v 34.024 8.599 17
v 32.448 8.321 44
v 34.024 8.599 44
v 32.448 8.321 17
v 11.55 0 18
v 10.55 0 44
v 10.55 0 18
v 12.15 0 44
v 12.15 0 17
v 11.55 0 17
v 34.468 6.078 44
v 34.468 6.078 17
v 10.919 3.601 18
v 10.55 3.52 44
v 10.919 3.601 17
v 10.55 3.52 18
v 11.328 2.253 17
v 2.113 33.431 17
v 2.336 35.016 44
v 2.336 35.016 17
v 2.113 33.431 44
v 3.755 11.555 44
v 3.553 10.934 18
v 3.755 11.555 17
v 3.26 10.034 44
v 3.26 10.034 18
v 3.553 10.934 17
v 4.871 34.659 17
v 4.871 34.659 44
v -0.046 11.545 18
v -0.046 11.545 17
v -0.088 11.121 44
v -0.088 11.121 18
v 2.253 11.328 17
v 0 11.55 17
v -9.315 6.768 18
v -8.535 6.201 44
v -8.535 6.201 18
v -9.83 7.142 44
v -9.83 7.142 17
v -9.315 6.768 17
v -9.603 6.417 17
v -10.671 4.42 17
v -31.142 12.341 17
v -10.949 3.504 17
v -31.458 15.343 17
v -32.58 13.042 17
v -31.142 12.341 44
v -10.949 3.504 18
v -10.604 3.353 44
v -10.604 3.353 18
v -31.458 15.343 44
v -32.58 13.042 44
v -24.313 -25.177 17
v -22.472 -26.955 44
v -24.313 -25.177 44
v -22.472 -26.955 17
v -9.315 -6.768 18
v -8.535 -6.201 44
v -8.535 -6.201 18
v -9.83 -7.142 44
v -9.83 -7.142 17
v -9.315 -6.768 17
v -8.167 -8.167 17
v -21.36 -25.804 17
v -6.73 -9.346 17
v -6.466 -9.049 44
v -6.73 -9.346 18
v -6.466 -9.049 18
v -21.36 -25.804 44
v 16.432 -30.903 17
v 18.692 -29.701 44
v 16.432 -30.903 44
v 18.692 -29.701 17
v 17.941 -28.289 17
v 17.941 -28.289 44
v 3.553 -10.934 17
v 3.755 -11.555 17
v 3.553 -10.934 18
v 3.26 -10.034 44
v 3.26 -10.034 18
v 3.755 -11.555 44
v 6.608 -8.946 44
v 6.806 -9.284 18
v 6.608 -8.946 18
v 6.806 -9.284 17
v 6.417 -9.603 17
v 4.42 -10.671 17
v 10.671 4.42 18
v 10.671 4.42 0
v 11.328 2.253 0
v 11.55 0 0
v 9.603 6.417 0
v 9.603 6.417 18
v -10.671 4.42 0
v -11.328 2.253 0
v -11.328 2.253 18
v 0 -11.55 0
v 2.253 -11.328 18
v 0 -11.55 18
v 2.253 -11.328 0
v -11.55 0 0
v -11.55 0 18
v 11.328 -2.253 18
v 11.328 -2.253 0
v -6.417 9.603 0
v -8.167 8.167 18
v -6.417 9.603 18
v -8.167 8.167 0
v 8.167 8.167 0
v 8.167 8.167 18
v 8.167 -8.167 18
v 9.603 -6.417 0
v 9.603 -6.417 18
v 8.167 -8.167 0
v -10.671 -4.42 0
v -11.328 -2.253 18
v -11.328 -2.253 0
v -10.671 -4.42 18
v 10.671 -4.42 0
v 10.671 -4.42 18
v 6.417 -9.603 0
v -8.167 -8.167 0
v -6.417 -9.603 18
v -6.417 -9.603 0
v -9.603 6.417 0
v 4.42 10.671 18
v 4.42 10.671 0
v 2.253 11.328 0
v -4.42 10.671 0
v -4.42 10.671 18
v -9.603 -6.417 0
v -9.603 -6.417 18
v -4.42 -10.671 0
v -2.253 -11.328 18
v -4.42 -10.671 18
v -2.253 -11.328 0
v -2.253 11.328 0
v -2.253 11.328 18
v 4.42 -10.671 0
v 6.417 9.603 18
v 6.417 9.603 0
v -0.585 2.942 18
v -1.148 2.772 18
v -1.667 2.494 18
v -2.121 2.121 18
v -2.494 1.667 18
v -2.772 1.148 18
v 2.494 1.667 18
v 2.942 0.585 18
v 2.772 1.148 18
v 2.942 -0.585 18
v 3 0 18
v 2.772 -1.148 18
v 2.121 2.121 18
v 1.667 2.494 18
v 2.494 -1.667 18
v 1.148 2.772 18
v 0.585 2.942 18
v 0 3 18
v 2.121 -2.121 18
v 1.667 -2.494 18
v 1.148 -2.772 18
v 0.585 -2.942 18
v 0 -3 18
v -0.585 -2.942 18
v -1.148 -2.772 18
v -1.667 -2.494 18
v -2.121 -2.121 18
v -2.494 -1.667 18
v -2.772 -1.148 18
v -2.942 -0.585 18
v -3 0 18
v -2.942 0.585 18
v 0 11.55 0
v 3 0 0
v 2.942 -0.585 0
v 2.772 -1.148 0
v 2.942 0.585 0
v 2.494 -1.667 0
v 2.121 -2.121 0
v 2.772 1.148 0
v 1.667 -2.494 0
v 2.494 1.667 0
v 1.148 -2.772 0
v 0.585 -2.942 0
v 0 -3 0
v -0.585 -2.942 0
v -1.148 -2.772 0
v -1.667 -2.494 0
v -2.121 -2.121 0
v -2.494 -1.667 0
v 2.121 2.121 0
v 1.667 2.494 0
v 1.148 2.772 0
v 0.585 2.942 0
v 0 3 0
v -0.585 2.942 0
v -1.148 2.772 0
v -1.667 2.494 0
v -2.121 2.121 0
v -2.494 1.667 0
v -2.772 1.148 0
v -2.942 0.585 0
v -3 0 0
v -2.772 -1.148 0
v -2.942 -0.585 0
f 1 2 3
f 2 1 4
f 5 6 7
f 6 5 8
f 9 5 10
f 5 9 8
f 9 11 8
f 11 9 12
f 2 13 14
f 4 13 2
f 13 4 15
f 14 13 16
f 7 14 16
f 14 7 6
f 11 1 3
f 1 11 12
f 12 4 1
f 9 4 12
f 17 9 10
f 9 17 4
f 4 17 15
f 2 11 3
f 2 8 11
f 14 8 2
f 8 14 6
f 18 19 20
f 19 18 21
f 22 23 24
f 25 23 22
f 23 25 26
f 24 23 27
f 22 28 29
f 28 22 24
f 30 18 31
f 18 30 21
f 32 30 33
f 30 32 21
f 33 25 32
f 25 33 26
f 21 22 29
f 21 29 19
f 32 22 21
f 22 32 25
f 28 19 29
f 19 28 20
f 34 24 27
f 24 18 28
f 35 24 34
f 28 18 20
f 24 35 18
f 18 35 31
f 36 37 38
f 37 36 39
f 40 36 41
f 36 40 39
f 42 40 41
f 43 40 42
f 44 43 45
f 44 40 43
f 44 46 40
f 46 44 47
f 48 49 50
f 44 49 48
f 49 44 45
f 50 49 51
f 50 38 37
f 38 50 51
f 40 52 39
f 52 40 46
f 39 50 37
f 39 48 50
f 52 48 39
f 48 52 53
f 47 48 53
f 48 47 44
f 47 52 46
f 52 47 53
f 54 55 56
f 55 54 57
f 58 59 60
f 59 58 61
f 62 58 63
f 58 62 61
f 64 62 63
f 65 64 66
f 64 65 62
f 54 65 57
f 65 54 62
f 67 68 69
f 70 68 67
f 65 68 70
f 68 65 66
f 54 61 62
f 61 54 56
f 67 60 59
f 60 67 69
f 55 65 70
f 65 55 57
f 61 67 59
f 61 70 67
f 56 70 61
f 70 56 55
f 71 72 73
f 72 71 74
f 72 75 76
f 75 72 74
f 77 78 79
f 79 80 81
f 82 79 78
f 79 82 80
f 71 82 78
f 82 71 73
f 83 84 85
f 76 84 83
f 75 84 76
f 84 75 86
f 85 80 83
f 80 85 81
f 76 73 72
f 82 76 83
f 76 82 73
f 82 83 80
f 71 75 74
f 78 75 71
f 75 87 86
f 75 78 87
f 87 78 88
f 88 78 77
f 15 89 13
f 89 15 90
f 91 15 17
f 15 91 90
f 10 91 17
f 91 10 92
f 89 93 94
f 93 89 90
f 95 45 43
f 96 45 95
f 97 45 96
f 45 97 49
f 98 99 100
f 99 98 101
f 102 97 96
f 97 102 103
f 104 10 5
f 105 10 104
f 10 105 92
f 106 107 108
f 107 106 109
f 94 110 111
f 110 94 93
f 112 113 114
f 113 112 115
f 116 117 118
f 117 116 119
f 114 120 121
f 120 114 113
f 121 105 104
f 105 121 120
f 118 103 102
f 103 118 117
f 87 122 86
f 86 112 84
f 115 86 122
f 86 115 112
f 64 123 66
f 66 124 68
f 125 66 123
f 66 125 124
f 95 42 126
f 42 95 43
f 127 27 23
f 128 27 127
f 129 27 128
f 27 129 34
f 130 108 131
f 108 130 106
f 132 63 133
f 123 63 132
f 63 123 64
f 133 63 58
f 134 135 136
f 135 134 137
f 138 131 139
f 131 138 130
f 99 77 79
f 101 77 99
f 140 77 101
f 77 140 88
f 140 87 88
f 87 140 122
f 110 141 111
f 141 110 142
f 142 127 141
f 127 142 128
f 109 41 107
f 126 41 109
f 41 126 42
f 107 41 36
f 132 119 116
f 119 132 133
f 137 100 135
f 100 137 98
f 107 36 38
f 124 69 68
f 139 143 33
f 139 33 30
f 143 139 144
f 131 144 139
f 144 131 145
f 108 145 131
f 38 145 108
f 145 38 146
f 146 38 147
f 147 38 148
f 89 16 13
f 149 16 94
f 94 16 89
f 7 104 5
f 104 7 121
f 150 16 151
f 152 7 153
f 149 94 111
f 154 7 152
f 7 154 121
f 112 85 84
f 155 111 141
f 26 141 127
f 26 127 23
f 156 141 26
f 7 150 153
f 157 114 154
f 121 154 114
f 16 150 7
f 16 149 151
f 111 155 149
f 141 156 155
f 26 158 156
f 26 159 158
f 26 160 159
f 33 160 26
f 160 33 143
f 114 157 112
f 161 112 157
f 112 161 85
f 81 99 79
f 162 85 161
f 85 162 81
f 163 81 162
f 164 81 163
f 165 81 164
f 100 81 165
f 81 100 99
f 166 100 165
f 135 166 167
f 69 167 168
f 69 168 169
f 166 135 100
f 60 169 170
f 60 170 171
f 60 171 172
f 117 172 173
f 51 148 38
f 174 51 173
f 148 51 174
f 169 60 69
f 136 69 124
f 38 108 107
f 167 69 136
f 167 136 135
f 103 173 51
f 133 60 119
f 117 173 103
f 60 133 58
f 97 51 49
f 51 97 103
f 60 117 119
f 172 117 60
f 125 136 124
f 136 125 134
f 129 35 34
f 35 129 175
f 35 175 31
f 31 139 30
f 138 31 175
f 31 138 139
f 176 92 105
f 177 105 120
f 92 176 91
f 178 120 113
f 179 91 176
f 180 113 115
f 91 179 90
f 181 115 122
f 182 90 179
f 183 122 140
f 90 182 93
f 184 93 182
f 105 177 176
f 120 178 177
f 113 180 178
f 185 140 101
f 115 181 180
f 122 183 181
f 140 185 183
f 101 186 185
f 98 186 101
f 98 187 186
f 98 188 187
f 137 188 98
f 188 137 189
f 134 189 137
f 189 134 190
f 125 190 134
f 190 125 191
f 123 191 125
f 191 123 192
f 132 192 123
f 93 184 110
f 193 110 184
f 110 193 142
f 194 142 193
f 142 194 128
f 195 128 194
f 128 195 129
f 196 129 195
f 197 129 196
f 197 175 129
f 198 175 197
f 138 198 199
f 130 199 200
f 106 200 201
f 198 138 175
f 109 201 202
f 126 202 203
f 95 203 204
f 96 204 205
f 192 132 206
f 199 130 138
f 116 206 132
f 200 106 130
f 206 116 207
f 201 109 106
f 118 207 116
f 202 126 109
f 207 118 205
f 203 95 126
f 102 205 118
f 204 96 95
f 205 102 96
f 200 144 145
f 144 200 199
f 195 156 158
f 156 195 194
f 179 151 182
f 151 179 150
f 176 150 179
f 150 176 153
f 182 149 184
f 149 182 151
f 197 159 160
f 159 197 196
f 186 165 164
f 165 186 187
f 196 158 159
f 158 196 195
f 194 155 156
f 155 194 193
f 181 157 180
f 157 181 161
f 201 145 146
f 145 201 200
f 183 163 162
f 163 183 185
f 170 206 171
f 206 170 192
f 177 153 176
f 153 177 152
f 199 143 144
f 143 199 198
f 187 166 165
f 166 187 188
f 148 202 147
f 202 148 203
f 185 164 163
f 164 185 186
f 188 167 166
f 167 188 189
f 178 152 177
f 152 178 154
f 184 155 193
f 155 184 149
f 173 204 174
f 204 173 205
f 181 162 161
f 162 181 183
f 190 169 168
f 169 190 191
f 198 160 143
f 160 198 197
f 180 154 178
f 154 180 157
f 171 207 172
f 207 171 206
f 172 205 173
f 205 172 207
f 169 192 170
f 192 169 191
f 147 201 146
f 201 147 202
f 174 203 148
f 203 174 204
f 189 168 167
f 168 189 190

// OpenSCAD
$fn = 32;

// ----------------------------------------------------------------------
// Impeller: 70 mm, 5 blades, 44 mm tall
// ----------------------------------------------------------------------

// --- parameters (mm) ---
hub_d = 23.1;             // hub diameter
hub_h = 18;               // hub height
imp_d = 70;               // outer diameter over the blades
blades = 5;               // number of blades
blade_t = 1.6;            // blade thickness
blade_h = 26;             // blade height
blade_in_r = 10.55;       // blade root radius
blade_out_r = 33.4;       // blade tip radius
sweep = 10;               // blade sweep, degrees
bore_d = 6;               // shaft bore

module hub() {
  cylinder(h = hub_h, d = hub_d);
}

module blade() {
  /* blade swept between two boxes: hull of the root and the tip section */
  hull() {
    translate([blade_in_r, 0, hub_h - 1])
      cube([blade_t, blade_t * 2.2, blade_h + 1], center = false);
    rotate([0, 0, sweep])
      translate([blade_out_r, 0, hub_h - 1])
        cube([blade_t, blade_t * 1.6, blade_h + 1], center = false);
  }
}

module blades() {
  for (i = [0 : blades - 1])
    rotate([0, 0, i * 360 / blades]) blade();
}

difference() {
  union() {
    hub();
    blades();
  }
  translate([0, 0, -1]) cylinder(h = hub_h + blade_h + 0 + 3, d = bore_d);
}
